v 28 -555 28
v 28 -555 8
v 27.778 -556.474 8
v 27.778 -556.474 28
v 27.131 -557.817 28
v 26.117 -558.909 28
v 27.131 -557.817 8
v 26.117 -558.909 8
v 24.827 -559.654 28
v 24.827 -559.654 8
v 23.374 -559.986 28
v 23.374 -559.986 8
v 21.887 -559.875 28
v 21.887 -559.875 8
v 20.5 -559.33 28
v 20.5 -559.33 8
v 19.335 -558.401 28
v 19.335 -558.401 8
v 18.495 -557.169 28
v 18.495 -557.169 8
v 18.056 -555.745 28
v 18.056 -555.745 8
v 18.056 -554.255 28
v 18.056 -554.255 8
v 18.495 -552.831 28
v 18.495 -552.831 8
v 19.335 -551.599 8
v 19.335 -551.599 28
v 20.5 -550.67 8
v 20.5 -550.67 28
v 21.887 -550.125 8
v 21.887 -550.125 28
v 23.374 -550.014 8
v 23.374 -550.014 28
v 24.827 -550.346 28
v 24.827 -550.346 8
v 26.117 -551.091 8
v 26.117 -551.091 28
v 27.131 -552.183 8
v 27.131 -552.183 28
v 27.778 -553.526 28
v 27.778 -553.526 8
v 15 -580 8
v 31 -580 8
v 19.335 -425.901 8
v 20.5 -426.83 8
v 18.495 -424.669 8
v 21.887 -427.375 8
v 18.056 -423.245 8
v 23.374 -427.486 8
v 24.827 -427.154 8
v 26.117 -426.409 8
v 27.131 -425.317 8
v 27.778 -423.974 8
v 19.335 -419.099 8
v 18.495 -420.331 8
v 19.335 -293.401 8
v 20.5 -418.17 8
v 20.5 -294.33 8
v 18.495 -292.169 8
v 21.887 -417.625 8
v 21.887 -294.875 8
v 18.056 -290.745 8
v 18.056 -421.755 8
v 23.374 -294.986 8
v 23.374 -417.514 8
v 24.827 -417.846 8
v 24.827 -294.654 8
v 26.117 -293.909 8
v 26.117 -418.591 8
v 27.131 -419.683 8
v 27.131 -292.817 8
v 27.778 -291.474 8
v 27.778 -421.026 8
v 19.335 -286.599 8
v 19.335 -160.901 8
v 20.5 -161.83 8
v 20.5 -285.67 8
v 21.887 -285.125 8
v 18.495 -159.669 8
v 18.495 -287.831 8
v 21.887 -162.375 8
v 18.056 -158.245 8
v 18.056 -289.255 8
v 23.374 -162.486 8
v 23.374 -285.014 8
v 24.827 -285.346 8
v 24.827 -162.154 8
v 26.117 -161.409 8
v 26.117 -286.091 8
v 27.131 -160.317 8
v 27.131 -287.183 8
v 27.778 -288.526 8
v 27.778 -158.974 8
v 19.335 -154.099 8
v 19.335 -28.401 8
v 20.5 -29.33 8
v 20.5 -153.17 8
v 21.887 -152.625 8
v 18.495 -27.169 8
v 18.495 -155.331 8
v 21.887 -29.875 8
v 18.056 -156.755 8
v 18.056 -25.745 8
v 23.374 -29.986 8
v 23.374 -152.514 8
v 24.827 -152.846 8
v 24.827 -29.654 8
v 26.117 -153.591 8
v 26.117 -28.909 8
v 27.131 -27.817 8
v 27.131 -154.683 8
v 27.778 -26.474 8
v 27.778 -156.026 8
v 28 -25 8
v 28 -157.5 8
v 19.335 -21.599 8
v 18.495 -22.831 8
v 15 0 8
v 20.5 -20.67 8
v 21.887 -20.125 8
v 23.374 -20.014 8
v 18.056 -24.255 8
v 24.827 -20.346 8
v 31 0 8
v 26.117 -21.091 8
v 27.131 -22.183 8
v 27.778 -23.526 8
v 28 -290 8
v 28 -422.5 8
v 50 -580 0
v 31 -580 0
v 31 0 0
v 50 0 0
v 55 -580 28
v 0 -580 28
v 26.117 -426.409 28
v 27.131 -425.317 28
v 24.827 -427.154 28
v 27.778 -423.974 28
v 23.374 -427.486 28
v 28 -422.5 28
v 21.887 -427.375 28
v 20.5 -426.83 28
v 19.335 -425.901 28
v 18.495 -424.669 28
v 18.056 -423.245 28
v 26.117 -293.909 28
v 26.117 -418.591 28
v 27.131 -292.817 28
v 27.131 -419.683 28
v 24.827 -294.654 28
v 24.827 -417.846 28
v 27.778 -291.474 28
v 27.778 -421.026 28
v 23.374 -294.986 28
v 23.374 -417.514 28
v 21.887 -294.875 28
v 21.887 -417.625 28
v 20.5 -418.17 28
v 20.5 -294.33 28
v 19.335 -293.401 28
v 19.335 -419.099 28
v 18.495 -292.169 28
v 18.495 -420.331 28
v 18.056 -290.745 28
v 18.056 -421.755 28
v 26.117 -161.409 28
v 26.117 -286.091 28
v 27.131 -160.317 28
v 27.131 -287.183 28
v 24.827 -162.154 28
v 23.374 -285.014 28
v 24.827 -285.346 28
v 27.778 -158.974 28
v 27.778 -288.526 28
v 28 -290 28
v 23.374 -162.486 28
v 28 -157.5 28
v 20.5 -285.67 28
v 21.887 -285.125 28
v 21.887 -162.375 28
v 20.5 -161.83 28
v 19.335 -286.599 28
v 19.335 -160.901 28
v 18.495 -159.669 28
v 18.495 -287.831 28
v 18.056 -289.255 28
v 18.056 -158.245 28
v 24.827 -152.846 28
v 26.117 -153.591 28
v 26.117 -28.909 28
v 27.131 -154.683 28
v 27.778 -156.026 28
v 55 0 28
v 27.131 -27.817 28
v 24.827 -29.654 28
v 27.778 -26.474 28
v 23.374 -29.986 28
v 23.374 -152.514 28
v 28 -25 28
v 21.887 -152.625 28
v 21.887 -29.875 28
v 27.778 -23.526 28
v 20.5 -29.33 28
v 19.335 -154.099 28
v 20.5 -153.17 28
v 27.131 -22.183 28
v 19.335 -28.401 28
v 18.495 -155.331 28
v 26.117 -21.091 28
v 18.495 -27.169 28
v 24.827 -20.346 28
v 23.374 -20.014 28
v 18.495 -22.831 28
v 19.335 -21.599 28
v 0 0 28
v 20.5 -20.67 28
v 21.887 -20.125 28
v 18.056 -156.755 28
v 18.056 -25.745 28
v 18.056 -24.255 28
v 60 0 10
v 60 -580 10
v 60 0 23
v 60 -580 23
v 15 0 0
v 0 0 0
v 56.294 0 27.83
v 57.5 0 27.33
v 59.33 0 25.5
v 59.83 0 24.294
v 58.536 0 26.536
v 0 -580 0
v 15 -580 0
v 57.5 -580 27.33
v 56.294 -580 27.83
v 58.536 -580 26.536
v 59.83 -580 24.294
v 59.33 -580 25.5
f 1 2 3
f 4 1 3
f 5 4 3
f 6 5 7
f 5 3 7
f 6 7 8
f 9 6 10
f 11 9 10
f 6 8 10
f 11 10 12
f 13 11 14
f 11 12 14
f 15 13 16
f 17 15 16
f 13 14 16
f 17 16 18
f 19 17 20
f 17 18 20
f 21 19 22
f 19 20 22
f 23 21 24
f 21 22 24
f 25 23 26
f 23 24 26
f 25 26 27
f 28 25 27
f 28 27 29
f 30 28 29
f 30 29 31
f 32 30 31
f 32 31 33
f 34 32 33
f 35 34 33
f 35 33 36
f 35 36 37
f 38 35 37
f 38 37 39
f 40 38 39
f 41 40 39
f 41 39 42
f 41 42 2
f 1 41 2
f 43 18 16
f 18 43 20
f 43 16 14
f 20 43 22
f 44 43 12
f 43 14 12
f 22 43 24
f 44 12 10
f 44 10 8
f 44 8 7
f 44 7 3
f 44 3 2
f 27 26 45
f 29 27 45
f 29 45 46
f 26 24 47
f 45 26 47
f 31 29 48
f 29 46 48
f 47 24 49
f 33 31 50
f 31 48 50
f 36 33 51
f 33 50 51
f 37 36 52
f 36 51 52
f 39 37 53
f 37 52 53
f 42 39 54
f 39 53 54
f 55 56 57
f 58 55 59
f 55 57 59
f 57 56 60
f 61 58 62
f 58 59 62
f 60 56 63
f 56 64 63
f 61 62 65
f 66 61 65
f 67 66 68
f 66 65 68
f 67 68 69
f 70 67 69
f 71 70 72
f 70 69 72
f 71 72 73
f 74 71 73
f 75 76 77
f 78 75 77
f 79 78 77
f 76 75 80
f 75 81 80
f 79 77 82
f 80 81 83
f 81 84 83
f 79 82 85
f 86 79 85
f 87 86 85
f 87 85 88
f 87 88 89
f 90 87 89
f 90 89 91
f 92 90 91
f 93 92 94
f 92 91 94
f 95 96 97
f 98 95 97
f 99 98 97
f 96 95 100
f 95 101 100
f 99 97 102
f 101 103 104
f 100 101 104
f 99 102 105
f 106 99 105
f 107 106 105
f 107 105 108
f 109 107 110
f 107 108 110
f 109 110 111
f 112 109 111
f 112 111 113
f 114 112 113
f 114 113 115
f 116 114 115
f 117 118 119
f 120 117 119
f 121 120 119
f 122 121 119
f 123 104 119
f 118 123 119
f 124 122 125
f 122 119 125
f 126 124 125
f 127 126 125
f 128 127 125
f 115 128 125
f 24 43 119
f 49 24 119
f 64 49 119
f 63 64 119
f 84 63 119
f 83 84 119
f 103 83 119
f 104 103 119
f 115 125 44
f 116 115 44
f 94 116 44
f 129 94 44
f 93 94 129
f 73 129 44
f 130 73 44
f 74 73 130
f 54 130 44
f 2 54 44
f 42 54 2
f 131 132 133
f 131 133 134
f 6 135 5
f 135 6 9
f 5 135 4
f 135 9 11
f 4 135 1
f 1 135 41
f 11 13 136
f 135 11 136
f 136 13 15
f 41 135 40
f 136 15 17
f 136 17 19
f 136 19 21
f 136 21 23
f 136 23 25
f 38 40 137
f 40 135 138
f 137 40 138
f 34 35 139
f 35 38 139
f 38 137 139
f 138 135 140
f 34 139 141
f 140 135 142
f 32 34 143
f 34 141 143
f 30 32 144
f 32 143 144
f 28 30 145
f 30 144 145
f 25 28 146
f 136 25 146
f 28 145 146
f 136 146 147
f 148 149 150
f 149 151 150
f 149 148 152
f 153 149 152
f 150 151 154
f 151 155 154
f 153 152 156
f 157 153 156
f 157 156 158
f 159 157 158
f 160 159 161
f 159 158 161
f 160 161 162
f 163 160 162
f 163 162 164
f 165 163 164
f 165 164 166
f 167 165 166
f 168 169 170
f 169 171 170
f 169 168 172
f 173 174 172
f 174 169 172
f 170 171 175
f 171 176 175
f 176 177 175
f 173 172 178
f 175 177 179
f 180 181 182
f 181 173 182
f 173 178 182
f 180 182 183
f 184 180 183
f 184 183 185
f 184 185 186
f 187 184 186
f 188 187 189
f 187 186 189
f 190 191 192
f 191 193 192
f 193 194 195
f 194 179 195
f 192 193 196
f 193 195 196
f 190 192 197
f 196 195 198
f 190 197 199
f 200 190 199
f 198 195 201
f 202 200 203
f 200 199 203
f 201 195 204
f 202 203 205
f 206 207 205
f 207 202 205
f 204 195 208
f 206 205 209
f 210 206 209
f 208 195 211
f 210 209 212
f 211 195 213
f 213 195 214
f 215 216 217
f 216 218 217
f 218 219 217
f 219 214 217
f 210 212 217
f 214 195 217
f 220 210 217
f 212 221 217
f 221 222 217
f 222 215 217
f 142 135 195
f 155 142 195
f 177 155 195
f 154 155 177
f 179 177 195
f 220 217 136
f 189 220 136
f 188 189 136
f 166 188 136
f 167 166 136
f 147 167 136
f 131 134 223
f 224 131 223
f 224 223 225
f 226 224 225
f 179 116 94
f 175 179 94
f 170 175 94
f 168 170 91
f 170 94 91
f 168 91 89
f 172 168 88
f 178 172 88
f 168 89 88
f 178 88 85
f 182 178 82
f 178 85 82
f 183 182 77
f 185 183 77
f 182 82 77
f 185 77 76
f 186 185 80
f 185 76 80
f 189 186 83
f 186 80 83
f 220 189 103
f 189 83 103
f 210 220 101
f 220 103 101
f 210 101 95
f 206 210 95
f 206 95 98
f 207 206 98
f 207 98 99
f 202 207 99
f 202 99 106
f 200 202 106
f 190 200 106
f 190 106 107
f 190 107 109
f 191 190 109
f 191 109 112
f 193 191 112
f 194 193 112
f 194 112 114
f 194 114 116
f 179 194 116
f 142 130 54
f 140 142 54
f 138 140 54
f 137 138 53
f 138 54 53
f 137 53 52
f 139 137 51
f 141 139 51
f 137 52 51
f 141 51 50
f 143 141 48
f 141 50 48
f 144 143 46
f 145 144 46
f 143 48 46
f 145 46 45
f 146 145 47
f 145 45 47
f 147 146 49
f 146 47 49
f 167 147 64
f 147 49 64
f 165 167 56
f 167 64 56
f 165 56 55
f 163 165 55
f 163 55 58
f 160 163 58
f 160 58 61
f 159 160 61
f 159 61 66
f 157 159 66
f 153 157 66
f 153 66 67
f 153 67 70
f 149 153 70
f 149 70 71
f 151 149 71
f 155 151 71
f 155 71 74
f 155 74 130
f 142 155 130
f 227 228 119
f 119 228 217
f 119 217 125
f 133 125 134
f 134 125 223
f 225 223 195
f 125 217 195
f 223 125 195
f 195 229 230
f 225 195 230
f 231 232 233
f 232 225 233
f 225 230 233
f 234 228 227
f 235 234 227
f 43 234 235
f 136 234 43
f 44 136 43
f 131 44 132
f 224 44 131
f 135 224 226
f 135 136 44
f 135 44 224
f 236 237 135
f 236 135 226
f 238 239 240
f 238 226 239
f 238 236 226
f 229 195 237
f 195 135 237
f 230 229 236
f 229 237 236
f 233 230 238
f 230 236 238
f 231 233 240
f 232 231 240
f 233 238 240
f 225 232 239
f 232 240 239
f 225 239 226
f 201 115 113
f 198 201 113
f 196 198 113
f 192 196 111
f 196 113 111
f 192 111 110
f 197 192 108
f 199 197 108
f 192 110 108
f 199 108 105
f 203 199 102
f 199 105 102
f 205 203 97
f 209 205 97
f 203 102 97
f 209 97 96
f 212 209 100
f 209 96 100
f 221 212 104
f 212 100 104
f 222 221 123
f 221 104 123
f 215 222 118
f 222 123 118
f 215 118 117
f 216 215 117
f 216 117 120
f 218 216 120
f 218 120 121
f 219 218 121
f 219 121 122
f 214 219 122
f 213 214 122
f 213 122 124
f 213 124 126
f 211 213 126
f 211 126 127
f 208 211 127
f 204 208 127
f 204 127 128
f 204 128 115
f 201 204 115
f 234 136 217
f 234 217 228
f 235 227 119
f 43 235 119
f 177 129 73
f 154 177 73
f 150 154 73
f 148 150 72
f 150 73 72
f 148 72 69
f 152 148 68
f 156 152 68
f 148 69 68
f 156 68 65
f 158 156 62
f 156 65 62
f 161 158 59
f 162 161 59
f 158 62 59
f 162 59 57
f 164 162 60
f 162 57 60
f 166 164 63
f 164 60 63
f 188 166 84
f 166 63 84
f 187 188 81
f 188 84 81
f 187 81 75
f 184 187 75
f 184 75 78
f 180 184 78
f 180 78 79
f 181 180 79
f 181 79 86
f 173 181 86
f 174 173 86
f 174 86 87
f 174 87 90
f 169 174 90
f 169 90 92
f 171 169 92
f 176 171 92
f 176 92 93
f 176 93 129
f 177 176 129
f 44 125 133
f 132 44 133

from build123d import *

# Parameters (mm, degrees)
F1_DEPTH = 580
F2_R     = 5
F3_DEPTH = 20.001
F4_R     = 5


with BuildPart() as f1:
    # F0 (on Front) → F1 (new body)
    with BuildSketch(Plane.XZ):
        Polygon((0, 28), (0, 0), (15, 0), (15, 8), (31, 8), (31, 0), (50, 0), (60, 10), (60, 28), align=None)
    extrude(amount=F1_DEPTH)

    # F2 (on face) → F3 (cut, through all)
    with BuildSketch(Plane(origin=(0, 0, 8), x_dir=(1, 0, 0), z_dir=(0, 0, -1))):
        with Locations((23, 25)):
            Circle(F2_R)
        with Locations((23, 157.5)):
            Circle(F2_R)
        with Locations((23, 290)):
            Circle(F2_R)
        with Locations((23, 422.5)):
            Circle(F2_R)
        with Locations((23, 555)):
            Circle(F2_R)
    extrude(amount=-F3_DEPTH, mode=Mode.SUBTRACT)

    # F4
    f4_edges = [f1.edges().sort_by_distance(p)[0] for p in [
        (60, -290, 28),
    ]]
    fillet(f4_edges, radius=F4_R)


solid = f1.part
